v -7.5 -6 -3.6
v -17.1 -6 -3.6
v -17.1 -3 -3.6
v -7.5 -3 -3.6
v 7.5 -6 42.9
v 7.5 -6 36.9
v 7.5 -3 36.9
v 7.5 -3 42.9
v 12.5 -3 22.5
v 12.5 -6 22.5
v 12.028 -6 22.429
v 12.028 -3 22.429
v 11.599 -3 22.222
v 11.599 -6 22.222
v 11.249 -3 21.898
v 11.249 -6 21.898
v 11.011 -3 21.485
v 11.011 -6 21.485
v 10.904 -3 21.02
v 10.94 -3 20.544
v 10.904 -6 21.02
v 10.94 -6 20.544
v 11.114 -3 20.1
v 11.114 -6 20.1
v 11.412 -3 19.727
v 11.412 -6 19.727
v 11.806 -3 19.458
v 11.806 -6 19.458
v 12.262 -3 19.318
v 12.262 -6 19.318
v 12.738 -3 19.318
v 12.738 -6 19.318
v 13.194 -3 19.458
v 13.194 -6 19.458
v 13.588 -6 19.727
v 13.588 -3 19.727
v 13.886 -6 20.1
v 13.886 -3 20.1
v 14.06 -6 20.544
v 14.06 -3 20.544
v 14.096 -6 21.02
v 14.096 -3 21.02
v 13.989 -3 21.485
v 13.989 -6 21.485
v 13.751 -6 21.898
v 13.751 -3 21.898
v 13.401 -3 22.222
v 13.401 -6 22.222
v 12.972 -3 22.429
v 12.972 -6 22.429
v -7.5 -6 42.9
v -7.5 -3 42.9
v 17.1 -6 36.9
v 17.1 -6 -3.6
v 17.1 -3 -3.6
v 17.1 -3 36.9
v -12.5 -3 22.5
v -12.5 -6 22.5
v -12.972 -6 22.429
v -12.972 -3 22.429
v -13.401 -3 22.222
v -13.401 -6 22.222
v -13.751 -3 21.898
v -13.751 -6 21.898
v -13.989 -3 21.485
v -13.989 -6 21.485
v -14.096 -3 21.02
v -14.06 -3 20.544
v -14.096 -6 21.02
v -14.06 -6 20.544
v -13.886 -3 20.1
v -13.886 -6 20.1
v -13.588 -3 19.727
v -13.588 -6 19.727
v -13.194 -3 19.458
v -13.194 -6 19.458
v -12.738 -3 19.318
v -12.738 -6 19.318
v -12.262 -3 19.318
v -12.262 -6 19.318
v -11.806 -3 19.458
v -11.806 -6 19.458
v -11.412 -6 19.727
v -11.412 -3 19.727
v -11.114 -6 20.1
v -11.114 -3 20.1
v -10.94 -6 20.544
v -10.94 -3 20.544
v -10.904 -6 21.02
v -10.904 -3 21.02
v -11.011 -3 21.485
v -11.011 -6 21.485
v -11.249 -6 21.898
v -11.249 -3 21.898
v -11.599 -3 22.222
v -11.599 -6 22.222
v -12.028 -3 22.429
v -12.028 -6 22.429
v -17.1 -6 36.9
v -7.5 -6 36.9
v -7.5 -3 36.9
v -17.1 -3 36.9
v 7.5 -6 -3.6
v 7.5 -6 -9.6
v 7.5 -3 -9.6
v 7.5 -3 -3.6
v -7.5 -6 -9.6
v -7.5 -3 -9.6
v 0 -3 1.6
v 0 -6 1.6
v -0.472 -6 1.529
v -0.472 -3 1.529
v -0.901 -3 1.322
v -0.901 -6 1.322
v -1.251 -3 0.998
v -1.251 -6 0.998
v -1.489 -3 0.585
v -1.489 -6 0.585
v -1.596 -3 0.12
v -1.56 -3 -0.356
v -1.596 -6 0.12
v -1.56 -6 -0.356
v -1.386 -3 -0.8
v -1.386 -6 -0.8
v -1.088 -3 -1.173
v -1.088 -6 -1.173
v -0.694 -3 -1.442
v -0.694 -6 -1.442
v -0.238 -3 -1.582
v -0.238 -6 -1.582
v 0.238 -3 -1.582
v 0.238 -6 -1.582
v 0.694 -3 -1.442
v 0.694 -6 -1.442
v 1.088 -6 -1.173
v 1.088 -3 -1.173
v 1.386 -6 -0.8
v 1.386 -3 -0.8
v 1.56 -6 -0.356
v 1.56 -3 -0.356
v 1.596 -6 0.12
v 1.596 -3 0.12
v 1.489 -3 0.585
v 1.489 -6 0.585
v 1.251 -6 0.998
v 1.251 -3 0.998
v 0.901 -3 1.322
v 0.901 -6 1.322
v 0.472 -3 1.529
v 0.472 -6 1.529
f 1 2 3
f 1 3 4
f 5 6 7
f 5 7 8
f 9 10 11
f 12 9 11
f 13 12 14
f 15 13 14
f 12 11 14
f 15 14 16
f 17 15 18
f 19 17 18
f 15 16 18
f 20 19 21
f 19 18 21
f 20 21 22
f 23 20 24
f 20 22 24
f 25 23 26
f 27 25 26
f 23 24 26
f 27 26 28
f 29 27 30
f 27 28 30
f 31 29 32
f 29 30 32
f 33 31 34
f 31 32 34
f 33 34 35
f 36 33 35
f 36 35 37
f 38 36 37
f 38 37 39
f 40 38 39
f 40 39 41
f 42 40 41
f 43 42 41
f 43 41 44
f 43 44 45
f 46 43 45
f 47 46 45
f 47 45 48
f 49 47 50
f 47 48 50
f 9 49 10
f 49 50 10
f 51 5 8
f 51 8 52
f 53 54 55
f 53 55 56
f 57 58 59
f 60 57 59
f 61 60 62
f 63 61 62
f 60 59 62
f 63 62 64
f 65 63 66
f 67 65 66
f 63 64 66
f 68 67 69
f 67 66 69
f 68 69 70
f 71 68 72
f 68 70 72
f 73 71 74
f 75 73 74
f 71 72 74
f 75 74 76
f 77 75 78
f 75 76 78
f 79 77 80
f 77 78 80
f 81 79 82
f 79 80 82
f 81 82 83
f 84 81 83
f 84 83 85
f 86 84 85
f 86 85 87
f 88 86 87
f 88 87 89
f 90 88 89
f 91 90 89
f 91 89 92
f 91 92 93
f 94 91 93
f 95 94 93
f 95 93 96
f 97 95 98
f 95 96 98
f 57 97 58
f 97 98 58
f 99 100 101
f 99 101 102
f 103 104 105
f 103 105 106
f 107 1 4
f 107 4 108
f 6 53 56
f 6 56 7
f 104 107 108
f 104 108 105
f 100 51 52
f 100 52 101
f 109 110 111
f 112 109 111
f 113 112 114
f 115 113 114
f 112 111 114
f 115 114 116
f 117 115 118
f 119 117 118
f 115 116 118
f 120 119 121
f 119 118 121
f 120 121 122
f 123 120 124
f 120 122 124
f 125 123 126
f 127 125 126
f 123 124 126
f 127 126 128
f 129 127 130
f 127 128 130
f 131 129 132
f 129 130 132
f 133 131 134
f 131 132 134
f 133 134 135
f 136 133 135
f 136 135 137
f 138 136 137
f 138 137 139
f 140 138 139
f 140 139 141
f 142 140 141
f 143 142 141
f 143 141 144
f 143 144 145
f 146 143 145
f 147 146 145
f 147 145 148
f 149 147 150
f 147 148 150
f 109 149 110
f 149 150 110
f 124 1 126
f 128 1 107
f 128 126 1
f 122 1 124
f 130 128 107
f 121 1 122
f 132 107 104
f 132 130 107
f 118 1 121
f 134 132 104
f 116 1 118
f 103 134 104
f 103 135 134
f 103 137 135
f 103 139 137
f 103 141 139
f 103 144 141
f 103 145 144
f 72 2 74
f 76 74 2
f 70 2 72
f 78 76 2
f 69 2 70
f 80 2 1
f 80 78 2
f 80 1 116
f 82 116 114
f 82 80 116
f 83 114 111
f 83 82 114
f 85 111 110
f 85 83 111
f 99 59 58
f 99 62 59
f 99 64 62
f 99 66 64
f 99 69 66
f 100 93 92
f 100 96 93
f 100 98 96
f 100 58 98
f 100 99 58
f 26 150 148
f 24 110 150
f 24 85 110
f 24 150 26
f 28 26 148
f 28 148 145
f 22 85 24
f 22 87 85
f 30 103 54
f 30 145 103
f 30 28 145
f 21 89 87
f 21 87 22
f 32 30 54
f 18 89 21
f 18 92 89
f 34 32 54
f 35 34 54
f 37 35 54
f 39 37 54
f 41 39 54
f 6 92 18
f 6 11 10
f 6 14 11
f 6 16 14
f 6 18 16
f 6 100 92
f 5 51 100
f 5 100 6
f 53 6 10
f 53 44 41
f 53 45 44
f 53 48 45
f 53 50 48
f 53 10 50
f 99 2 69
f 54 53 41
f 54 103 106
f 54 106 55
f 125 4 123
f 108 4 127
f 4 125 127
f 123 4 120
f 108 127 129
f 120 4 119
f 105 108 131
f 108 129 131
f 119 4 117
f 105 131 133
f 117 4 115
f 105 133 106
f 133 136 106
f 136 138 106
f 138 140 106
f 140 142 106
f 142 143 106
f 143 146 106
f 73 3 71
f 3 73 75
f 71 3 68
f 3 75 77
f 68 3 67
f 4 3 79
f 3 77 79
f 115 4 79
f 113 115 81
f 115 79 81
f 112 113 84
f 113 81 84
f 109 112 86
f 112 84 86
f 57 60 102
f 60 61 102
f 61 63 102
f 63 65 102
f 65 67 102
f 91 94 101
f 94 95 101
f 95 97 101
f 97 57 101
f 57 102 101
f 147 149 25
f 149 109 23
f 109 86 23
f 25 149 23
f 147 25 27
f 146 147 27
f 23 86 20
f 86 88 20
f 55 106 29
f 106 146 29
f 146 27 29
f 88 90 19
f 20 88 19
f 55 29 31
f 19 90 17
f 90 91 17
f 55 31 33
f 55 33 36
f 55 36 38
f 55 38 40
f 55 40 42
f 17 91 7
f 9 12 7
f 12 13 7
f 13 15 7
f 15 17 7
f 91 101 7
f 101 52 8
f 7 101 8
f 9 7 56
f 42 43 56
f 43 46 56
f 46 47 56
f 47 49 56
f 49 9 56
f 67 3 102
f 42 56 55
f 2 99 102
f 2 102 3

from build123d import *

# Parameters (mm, degrees)
ESBO_O1_R                = 1.6
RESSALTO_EXTRUS_O1_DEPTH = 3


with BuildPart() as part:
    # Esboço1 → Ressalto-extrusão1 (new body)
    with BuildSketch(Plane.XZ.offset(6)):
        Polygon((17.1, 36.9), (7.5, 36.9), (7.5, 42.9), (-7.5, 42.9), (-7.5, 36.9), (-17.1, 36.9), (-17.1, -3.6), (-7.5, -3.6), (-7.5, -9.6), (7.5, -9.6), (7.5, -3.6), (17.1, -3.6), align=None)
        with Locations(Location((-12.5, 20.9, 0), (0, 0, 90))):
            Circle(ESBO_O1_R, mode=Mode.SUBTRACT)
        with Locations(Location((0, 0, 0), (0, 0, 90))):
            Circle(ESBO_O1_R, mode=Mode.SUBTRACT)
        with Locations(Location((12.5, 20.9, 0), (0, 0, 90))):
            Circle(ESBO_O1_R, mode=Mode.SUBTRACT)
    extrude(amount=-RESSALTO_EXTRUS_O1_DEPTH)


solid = part.part
